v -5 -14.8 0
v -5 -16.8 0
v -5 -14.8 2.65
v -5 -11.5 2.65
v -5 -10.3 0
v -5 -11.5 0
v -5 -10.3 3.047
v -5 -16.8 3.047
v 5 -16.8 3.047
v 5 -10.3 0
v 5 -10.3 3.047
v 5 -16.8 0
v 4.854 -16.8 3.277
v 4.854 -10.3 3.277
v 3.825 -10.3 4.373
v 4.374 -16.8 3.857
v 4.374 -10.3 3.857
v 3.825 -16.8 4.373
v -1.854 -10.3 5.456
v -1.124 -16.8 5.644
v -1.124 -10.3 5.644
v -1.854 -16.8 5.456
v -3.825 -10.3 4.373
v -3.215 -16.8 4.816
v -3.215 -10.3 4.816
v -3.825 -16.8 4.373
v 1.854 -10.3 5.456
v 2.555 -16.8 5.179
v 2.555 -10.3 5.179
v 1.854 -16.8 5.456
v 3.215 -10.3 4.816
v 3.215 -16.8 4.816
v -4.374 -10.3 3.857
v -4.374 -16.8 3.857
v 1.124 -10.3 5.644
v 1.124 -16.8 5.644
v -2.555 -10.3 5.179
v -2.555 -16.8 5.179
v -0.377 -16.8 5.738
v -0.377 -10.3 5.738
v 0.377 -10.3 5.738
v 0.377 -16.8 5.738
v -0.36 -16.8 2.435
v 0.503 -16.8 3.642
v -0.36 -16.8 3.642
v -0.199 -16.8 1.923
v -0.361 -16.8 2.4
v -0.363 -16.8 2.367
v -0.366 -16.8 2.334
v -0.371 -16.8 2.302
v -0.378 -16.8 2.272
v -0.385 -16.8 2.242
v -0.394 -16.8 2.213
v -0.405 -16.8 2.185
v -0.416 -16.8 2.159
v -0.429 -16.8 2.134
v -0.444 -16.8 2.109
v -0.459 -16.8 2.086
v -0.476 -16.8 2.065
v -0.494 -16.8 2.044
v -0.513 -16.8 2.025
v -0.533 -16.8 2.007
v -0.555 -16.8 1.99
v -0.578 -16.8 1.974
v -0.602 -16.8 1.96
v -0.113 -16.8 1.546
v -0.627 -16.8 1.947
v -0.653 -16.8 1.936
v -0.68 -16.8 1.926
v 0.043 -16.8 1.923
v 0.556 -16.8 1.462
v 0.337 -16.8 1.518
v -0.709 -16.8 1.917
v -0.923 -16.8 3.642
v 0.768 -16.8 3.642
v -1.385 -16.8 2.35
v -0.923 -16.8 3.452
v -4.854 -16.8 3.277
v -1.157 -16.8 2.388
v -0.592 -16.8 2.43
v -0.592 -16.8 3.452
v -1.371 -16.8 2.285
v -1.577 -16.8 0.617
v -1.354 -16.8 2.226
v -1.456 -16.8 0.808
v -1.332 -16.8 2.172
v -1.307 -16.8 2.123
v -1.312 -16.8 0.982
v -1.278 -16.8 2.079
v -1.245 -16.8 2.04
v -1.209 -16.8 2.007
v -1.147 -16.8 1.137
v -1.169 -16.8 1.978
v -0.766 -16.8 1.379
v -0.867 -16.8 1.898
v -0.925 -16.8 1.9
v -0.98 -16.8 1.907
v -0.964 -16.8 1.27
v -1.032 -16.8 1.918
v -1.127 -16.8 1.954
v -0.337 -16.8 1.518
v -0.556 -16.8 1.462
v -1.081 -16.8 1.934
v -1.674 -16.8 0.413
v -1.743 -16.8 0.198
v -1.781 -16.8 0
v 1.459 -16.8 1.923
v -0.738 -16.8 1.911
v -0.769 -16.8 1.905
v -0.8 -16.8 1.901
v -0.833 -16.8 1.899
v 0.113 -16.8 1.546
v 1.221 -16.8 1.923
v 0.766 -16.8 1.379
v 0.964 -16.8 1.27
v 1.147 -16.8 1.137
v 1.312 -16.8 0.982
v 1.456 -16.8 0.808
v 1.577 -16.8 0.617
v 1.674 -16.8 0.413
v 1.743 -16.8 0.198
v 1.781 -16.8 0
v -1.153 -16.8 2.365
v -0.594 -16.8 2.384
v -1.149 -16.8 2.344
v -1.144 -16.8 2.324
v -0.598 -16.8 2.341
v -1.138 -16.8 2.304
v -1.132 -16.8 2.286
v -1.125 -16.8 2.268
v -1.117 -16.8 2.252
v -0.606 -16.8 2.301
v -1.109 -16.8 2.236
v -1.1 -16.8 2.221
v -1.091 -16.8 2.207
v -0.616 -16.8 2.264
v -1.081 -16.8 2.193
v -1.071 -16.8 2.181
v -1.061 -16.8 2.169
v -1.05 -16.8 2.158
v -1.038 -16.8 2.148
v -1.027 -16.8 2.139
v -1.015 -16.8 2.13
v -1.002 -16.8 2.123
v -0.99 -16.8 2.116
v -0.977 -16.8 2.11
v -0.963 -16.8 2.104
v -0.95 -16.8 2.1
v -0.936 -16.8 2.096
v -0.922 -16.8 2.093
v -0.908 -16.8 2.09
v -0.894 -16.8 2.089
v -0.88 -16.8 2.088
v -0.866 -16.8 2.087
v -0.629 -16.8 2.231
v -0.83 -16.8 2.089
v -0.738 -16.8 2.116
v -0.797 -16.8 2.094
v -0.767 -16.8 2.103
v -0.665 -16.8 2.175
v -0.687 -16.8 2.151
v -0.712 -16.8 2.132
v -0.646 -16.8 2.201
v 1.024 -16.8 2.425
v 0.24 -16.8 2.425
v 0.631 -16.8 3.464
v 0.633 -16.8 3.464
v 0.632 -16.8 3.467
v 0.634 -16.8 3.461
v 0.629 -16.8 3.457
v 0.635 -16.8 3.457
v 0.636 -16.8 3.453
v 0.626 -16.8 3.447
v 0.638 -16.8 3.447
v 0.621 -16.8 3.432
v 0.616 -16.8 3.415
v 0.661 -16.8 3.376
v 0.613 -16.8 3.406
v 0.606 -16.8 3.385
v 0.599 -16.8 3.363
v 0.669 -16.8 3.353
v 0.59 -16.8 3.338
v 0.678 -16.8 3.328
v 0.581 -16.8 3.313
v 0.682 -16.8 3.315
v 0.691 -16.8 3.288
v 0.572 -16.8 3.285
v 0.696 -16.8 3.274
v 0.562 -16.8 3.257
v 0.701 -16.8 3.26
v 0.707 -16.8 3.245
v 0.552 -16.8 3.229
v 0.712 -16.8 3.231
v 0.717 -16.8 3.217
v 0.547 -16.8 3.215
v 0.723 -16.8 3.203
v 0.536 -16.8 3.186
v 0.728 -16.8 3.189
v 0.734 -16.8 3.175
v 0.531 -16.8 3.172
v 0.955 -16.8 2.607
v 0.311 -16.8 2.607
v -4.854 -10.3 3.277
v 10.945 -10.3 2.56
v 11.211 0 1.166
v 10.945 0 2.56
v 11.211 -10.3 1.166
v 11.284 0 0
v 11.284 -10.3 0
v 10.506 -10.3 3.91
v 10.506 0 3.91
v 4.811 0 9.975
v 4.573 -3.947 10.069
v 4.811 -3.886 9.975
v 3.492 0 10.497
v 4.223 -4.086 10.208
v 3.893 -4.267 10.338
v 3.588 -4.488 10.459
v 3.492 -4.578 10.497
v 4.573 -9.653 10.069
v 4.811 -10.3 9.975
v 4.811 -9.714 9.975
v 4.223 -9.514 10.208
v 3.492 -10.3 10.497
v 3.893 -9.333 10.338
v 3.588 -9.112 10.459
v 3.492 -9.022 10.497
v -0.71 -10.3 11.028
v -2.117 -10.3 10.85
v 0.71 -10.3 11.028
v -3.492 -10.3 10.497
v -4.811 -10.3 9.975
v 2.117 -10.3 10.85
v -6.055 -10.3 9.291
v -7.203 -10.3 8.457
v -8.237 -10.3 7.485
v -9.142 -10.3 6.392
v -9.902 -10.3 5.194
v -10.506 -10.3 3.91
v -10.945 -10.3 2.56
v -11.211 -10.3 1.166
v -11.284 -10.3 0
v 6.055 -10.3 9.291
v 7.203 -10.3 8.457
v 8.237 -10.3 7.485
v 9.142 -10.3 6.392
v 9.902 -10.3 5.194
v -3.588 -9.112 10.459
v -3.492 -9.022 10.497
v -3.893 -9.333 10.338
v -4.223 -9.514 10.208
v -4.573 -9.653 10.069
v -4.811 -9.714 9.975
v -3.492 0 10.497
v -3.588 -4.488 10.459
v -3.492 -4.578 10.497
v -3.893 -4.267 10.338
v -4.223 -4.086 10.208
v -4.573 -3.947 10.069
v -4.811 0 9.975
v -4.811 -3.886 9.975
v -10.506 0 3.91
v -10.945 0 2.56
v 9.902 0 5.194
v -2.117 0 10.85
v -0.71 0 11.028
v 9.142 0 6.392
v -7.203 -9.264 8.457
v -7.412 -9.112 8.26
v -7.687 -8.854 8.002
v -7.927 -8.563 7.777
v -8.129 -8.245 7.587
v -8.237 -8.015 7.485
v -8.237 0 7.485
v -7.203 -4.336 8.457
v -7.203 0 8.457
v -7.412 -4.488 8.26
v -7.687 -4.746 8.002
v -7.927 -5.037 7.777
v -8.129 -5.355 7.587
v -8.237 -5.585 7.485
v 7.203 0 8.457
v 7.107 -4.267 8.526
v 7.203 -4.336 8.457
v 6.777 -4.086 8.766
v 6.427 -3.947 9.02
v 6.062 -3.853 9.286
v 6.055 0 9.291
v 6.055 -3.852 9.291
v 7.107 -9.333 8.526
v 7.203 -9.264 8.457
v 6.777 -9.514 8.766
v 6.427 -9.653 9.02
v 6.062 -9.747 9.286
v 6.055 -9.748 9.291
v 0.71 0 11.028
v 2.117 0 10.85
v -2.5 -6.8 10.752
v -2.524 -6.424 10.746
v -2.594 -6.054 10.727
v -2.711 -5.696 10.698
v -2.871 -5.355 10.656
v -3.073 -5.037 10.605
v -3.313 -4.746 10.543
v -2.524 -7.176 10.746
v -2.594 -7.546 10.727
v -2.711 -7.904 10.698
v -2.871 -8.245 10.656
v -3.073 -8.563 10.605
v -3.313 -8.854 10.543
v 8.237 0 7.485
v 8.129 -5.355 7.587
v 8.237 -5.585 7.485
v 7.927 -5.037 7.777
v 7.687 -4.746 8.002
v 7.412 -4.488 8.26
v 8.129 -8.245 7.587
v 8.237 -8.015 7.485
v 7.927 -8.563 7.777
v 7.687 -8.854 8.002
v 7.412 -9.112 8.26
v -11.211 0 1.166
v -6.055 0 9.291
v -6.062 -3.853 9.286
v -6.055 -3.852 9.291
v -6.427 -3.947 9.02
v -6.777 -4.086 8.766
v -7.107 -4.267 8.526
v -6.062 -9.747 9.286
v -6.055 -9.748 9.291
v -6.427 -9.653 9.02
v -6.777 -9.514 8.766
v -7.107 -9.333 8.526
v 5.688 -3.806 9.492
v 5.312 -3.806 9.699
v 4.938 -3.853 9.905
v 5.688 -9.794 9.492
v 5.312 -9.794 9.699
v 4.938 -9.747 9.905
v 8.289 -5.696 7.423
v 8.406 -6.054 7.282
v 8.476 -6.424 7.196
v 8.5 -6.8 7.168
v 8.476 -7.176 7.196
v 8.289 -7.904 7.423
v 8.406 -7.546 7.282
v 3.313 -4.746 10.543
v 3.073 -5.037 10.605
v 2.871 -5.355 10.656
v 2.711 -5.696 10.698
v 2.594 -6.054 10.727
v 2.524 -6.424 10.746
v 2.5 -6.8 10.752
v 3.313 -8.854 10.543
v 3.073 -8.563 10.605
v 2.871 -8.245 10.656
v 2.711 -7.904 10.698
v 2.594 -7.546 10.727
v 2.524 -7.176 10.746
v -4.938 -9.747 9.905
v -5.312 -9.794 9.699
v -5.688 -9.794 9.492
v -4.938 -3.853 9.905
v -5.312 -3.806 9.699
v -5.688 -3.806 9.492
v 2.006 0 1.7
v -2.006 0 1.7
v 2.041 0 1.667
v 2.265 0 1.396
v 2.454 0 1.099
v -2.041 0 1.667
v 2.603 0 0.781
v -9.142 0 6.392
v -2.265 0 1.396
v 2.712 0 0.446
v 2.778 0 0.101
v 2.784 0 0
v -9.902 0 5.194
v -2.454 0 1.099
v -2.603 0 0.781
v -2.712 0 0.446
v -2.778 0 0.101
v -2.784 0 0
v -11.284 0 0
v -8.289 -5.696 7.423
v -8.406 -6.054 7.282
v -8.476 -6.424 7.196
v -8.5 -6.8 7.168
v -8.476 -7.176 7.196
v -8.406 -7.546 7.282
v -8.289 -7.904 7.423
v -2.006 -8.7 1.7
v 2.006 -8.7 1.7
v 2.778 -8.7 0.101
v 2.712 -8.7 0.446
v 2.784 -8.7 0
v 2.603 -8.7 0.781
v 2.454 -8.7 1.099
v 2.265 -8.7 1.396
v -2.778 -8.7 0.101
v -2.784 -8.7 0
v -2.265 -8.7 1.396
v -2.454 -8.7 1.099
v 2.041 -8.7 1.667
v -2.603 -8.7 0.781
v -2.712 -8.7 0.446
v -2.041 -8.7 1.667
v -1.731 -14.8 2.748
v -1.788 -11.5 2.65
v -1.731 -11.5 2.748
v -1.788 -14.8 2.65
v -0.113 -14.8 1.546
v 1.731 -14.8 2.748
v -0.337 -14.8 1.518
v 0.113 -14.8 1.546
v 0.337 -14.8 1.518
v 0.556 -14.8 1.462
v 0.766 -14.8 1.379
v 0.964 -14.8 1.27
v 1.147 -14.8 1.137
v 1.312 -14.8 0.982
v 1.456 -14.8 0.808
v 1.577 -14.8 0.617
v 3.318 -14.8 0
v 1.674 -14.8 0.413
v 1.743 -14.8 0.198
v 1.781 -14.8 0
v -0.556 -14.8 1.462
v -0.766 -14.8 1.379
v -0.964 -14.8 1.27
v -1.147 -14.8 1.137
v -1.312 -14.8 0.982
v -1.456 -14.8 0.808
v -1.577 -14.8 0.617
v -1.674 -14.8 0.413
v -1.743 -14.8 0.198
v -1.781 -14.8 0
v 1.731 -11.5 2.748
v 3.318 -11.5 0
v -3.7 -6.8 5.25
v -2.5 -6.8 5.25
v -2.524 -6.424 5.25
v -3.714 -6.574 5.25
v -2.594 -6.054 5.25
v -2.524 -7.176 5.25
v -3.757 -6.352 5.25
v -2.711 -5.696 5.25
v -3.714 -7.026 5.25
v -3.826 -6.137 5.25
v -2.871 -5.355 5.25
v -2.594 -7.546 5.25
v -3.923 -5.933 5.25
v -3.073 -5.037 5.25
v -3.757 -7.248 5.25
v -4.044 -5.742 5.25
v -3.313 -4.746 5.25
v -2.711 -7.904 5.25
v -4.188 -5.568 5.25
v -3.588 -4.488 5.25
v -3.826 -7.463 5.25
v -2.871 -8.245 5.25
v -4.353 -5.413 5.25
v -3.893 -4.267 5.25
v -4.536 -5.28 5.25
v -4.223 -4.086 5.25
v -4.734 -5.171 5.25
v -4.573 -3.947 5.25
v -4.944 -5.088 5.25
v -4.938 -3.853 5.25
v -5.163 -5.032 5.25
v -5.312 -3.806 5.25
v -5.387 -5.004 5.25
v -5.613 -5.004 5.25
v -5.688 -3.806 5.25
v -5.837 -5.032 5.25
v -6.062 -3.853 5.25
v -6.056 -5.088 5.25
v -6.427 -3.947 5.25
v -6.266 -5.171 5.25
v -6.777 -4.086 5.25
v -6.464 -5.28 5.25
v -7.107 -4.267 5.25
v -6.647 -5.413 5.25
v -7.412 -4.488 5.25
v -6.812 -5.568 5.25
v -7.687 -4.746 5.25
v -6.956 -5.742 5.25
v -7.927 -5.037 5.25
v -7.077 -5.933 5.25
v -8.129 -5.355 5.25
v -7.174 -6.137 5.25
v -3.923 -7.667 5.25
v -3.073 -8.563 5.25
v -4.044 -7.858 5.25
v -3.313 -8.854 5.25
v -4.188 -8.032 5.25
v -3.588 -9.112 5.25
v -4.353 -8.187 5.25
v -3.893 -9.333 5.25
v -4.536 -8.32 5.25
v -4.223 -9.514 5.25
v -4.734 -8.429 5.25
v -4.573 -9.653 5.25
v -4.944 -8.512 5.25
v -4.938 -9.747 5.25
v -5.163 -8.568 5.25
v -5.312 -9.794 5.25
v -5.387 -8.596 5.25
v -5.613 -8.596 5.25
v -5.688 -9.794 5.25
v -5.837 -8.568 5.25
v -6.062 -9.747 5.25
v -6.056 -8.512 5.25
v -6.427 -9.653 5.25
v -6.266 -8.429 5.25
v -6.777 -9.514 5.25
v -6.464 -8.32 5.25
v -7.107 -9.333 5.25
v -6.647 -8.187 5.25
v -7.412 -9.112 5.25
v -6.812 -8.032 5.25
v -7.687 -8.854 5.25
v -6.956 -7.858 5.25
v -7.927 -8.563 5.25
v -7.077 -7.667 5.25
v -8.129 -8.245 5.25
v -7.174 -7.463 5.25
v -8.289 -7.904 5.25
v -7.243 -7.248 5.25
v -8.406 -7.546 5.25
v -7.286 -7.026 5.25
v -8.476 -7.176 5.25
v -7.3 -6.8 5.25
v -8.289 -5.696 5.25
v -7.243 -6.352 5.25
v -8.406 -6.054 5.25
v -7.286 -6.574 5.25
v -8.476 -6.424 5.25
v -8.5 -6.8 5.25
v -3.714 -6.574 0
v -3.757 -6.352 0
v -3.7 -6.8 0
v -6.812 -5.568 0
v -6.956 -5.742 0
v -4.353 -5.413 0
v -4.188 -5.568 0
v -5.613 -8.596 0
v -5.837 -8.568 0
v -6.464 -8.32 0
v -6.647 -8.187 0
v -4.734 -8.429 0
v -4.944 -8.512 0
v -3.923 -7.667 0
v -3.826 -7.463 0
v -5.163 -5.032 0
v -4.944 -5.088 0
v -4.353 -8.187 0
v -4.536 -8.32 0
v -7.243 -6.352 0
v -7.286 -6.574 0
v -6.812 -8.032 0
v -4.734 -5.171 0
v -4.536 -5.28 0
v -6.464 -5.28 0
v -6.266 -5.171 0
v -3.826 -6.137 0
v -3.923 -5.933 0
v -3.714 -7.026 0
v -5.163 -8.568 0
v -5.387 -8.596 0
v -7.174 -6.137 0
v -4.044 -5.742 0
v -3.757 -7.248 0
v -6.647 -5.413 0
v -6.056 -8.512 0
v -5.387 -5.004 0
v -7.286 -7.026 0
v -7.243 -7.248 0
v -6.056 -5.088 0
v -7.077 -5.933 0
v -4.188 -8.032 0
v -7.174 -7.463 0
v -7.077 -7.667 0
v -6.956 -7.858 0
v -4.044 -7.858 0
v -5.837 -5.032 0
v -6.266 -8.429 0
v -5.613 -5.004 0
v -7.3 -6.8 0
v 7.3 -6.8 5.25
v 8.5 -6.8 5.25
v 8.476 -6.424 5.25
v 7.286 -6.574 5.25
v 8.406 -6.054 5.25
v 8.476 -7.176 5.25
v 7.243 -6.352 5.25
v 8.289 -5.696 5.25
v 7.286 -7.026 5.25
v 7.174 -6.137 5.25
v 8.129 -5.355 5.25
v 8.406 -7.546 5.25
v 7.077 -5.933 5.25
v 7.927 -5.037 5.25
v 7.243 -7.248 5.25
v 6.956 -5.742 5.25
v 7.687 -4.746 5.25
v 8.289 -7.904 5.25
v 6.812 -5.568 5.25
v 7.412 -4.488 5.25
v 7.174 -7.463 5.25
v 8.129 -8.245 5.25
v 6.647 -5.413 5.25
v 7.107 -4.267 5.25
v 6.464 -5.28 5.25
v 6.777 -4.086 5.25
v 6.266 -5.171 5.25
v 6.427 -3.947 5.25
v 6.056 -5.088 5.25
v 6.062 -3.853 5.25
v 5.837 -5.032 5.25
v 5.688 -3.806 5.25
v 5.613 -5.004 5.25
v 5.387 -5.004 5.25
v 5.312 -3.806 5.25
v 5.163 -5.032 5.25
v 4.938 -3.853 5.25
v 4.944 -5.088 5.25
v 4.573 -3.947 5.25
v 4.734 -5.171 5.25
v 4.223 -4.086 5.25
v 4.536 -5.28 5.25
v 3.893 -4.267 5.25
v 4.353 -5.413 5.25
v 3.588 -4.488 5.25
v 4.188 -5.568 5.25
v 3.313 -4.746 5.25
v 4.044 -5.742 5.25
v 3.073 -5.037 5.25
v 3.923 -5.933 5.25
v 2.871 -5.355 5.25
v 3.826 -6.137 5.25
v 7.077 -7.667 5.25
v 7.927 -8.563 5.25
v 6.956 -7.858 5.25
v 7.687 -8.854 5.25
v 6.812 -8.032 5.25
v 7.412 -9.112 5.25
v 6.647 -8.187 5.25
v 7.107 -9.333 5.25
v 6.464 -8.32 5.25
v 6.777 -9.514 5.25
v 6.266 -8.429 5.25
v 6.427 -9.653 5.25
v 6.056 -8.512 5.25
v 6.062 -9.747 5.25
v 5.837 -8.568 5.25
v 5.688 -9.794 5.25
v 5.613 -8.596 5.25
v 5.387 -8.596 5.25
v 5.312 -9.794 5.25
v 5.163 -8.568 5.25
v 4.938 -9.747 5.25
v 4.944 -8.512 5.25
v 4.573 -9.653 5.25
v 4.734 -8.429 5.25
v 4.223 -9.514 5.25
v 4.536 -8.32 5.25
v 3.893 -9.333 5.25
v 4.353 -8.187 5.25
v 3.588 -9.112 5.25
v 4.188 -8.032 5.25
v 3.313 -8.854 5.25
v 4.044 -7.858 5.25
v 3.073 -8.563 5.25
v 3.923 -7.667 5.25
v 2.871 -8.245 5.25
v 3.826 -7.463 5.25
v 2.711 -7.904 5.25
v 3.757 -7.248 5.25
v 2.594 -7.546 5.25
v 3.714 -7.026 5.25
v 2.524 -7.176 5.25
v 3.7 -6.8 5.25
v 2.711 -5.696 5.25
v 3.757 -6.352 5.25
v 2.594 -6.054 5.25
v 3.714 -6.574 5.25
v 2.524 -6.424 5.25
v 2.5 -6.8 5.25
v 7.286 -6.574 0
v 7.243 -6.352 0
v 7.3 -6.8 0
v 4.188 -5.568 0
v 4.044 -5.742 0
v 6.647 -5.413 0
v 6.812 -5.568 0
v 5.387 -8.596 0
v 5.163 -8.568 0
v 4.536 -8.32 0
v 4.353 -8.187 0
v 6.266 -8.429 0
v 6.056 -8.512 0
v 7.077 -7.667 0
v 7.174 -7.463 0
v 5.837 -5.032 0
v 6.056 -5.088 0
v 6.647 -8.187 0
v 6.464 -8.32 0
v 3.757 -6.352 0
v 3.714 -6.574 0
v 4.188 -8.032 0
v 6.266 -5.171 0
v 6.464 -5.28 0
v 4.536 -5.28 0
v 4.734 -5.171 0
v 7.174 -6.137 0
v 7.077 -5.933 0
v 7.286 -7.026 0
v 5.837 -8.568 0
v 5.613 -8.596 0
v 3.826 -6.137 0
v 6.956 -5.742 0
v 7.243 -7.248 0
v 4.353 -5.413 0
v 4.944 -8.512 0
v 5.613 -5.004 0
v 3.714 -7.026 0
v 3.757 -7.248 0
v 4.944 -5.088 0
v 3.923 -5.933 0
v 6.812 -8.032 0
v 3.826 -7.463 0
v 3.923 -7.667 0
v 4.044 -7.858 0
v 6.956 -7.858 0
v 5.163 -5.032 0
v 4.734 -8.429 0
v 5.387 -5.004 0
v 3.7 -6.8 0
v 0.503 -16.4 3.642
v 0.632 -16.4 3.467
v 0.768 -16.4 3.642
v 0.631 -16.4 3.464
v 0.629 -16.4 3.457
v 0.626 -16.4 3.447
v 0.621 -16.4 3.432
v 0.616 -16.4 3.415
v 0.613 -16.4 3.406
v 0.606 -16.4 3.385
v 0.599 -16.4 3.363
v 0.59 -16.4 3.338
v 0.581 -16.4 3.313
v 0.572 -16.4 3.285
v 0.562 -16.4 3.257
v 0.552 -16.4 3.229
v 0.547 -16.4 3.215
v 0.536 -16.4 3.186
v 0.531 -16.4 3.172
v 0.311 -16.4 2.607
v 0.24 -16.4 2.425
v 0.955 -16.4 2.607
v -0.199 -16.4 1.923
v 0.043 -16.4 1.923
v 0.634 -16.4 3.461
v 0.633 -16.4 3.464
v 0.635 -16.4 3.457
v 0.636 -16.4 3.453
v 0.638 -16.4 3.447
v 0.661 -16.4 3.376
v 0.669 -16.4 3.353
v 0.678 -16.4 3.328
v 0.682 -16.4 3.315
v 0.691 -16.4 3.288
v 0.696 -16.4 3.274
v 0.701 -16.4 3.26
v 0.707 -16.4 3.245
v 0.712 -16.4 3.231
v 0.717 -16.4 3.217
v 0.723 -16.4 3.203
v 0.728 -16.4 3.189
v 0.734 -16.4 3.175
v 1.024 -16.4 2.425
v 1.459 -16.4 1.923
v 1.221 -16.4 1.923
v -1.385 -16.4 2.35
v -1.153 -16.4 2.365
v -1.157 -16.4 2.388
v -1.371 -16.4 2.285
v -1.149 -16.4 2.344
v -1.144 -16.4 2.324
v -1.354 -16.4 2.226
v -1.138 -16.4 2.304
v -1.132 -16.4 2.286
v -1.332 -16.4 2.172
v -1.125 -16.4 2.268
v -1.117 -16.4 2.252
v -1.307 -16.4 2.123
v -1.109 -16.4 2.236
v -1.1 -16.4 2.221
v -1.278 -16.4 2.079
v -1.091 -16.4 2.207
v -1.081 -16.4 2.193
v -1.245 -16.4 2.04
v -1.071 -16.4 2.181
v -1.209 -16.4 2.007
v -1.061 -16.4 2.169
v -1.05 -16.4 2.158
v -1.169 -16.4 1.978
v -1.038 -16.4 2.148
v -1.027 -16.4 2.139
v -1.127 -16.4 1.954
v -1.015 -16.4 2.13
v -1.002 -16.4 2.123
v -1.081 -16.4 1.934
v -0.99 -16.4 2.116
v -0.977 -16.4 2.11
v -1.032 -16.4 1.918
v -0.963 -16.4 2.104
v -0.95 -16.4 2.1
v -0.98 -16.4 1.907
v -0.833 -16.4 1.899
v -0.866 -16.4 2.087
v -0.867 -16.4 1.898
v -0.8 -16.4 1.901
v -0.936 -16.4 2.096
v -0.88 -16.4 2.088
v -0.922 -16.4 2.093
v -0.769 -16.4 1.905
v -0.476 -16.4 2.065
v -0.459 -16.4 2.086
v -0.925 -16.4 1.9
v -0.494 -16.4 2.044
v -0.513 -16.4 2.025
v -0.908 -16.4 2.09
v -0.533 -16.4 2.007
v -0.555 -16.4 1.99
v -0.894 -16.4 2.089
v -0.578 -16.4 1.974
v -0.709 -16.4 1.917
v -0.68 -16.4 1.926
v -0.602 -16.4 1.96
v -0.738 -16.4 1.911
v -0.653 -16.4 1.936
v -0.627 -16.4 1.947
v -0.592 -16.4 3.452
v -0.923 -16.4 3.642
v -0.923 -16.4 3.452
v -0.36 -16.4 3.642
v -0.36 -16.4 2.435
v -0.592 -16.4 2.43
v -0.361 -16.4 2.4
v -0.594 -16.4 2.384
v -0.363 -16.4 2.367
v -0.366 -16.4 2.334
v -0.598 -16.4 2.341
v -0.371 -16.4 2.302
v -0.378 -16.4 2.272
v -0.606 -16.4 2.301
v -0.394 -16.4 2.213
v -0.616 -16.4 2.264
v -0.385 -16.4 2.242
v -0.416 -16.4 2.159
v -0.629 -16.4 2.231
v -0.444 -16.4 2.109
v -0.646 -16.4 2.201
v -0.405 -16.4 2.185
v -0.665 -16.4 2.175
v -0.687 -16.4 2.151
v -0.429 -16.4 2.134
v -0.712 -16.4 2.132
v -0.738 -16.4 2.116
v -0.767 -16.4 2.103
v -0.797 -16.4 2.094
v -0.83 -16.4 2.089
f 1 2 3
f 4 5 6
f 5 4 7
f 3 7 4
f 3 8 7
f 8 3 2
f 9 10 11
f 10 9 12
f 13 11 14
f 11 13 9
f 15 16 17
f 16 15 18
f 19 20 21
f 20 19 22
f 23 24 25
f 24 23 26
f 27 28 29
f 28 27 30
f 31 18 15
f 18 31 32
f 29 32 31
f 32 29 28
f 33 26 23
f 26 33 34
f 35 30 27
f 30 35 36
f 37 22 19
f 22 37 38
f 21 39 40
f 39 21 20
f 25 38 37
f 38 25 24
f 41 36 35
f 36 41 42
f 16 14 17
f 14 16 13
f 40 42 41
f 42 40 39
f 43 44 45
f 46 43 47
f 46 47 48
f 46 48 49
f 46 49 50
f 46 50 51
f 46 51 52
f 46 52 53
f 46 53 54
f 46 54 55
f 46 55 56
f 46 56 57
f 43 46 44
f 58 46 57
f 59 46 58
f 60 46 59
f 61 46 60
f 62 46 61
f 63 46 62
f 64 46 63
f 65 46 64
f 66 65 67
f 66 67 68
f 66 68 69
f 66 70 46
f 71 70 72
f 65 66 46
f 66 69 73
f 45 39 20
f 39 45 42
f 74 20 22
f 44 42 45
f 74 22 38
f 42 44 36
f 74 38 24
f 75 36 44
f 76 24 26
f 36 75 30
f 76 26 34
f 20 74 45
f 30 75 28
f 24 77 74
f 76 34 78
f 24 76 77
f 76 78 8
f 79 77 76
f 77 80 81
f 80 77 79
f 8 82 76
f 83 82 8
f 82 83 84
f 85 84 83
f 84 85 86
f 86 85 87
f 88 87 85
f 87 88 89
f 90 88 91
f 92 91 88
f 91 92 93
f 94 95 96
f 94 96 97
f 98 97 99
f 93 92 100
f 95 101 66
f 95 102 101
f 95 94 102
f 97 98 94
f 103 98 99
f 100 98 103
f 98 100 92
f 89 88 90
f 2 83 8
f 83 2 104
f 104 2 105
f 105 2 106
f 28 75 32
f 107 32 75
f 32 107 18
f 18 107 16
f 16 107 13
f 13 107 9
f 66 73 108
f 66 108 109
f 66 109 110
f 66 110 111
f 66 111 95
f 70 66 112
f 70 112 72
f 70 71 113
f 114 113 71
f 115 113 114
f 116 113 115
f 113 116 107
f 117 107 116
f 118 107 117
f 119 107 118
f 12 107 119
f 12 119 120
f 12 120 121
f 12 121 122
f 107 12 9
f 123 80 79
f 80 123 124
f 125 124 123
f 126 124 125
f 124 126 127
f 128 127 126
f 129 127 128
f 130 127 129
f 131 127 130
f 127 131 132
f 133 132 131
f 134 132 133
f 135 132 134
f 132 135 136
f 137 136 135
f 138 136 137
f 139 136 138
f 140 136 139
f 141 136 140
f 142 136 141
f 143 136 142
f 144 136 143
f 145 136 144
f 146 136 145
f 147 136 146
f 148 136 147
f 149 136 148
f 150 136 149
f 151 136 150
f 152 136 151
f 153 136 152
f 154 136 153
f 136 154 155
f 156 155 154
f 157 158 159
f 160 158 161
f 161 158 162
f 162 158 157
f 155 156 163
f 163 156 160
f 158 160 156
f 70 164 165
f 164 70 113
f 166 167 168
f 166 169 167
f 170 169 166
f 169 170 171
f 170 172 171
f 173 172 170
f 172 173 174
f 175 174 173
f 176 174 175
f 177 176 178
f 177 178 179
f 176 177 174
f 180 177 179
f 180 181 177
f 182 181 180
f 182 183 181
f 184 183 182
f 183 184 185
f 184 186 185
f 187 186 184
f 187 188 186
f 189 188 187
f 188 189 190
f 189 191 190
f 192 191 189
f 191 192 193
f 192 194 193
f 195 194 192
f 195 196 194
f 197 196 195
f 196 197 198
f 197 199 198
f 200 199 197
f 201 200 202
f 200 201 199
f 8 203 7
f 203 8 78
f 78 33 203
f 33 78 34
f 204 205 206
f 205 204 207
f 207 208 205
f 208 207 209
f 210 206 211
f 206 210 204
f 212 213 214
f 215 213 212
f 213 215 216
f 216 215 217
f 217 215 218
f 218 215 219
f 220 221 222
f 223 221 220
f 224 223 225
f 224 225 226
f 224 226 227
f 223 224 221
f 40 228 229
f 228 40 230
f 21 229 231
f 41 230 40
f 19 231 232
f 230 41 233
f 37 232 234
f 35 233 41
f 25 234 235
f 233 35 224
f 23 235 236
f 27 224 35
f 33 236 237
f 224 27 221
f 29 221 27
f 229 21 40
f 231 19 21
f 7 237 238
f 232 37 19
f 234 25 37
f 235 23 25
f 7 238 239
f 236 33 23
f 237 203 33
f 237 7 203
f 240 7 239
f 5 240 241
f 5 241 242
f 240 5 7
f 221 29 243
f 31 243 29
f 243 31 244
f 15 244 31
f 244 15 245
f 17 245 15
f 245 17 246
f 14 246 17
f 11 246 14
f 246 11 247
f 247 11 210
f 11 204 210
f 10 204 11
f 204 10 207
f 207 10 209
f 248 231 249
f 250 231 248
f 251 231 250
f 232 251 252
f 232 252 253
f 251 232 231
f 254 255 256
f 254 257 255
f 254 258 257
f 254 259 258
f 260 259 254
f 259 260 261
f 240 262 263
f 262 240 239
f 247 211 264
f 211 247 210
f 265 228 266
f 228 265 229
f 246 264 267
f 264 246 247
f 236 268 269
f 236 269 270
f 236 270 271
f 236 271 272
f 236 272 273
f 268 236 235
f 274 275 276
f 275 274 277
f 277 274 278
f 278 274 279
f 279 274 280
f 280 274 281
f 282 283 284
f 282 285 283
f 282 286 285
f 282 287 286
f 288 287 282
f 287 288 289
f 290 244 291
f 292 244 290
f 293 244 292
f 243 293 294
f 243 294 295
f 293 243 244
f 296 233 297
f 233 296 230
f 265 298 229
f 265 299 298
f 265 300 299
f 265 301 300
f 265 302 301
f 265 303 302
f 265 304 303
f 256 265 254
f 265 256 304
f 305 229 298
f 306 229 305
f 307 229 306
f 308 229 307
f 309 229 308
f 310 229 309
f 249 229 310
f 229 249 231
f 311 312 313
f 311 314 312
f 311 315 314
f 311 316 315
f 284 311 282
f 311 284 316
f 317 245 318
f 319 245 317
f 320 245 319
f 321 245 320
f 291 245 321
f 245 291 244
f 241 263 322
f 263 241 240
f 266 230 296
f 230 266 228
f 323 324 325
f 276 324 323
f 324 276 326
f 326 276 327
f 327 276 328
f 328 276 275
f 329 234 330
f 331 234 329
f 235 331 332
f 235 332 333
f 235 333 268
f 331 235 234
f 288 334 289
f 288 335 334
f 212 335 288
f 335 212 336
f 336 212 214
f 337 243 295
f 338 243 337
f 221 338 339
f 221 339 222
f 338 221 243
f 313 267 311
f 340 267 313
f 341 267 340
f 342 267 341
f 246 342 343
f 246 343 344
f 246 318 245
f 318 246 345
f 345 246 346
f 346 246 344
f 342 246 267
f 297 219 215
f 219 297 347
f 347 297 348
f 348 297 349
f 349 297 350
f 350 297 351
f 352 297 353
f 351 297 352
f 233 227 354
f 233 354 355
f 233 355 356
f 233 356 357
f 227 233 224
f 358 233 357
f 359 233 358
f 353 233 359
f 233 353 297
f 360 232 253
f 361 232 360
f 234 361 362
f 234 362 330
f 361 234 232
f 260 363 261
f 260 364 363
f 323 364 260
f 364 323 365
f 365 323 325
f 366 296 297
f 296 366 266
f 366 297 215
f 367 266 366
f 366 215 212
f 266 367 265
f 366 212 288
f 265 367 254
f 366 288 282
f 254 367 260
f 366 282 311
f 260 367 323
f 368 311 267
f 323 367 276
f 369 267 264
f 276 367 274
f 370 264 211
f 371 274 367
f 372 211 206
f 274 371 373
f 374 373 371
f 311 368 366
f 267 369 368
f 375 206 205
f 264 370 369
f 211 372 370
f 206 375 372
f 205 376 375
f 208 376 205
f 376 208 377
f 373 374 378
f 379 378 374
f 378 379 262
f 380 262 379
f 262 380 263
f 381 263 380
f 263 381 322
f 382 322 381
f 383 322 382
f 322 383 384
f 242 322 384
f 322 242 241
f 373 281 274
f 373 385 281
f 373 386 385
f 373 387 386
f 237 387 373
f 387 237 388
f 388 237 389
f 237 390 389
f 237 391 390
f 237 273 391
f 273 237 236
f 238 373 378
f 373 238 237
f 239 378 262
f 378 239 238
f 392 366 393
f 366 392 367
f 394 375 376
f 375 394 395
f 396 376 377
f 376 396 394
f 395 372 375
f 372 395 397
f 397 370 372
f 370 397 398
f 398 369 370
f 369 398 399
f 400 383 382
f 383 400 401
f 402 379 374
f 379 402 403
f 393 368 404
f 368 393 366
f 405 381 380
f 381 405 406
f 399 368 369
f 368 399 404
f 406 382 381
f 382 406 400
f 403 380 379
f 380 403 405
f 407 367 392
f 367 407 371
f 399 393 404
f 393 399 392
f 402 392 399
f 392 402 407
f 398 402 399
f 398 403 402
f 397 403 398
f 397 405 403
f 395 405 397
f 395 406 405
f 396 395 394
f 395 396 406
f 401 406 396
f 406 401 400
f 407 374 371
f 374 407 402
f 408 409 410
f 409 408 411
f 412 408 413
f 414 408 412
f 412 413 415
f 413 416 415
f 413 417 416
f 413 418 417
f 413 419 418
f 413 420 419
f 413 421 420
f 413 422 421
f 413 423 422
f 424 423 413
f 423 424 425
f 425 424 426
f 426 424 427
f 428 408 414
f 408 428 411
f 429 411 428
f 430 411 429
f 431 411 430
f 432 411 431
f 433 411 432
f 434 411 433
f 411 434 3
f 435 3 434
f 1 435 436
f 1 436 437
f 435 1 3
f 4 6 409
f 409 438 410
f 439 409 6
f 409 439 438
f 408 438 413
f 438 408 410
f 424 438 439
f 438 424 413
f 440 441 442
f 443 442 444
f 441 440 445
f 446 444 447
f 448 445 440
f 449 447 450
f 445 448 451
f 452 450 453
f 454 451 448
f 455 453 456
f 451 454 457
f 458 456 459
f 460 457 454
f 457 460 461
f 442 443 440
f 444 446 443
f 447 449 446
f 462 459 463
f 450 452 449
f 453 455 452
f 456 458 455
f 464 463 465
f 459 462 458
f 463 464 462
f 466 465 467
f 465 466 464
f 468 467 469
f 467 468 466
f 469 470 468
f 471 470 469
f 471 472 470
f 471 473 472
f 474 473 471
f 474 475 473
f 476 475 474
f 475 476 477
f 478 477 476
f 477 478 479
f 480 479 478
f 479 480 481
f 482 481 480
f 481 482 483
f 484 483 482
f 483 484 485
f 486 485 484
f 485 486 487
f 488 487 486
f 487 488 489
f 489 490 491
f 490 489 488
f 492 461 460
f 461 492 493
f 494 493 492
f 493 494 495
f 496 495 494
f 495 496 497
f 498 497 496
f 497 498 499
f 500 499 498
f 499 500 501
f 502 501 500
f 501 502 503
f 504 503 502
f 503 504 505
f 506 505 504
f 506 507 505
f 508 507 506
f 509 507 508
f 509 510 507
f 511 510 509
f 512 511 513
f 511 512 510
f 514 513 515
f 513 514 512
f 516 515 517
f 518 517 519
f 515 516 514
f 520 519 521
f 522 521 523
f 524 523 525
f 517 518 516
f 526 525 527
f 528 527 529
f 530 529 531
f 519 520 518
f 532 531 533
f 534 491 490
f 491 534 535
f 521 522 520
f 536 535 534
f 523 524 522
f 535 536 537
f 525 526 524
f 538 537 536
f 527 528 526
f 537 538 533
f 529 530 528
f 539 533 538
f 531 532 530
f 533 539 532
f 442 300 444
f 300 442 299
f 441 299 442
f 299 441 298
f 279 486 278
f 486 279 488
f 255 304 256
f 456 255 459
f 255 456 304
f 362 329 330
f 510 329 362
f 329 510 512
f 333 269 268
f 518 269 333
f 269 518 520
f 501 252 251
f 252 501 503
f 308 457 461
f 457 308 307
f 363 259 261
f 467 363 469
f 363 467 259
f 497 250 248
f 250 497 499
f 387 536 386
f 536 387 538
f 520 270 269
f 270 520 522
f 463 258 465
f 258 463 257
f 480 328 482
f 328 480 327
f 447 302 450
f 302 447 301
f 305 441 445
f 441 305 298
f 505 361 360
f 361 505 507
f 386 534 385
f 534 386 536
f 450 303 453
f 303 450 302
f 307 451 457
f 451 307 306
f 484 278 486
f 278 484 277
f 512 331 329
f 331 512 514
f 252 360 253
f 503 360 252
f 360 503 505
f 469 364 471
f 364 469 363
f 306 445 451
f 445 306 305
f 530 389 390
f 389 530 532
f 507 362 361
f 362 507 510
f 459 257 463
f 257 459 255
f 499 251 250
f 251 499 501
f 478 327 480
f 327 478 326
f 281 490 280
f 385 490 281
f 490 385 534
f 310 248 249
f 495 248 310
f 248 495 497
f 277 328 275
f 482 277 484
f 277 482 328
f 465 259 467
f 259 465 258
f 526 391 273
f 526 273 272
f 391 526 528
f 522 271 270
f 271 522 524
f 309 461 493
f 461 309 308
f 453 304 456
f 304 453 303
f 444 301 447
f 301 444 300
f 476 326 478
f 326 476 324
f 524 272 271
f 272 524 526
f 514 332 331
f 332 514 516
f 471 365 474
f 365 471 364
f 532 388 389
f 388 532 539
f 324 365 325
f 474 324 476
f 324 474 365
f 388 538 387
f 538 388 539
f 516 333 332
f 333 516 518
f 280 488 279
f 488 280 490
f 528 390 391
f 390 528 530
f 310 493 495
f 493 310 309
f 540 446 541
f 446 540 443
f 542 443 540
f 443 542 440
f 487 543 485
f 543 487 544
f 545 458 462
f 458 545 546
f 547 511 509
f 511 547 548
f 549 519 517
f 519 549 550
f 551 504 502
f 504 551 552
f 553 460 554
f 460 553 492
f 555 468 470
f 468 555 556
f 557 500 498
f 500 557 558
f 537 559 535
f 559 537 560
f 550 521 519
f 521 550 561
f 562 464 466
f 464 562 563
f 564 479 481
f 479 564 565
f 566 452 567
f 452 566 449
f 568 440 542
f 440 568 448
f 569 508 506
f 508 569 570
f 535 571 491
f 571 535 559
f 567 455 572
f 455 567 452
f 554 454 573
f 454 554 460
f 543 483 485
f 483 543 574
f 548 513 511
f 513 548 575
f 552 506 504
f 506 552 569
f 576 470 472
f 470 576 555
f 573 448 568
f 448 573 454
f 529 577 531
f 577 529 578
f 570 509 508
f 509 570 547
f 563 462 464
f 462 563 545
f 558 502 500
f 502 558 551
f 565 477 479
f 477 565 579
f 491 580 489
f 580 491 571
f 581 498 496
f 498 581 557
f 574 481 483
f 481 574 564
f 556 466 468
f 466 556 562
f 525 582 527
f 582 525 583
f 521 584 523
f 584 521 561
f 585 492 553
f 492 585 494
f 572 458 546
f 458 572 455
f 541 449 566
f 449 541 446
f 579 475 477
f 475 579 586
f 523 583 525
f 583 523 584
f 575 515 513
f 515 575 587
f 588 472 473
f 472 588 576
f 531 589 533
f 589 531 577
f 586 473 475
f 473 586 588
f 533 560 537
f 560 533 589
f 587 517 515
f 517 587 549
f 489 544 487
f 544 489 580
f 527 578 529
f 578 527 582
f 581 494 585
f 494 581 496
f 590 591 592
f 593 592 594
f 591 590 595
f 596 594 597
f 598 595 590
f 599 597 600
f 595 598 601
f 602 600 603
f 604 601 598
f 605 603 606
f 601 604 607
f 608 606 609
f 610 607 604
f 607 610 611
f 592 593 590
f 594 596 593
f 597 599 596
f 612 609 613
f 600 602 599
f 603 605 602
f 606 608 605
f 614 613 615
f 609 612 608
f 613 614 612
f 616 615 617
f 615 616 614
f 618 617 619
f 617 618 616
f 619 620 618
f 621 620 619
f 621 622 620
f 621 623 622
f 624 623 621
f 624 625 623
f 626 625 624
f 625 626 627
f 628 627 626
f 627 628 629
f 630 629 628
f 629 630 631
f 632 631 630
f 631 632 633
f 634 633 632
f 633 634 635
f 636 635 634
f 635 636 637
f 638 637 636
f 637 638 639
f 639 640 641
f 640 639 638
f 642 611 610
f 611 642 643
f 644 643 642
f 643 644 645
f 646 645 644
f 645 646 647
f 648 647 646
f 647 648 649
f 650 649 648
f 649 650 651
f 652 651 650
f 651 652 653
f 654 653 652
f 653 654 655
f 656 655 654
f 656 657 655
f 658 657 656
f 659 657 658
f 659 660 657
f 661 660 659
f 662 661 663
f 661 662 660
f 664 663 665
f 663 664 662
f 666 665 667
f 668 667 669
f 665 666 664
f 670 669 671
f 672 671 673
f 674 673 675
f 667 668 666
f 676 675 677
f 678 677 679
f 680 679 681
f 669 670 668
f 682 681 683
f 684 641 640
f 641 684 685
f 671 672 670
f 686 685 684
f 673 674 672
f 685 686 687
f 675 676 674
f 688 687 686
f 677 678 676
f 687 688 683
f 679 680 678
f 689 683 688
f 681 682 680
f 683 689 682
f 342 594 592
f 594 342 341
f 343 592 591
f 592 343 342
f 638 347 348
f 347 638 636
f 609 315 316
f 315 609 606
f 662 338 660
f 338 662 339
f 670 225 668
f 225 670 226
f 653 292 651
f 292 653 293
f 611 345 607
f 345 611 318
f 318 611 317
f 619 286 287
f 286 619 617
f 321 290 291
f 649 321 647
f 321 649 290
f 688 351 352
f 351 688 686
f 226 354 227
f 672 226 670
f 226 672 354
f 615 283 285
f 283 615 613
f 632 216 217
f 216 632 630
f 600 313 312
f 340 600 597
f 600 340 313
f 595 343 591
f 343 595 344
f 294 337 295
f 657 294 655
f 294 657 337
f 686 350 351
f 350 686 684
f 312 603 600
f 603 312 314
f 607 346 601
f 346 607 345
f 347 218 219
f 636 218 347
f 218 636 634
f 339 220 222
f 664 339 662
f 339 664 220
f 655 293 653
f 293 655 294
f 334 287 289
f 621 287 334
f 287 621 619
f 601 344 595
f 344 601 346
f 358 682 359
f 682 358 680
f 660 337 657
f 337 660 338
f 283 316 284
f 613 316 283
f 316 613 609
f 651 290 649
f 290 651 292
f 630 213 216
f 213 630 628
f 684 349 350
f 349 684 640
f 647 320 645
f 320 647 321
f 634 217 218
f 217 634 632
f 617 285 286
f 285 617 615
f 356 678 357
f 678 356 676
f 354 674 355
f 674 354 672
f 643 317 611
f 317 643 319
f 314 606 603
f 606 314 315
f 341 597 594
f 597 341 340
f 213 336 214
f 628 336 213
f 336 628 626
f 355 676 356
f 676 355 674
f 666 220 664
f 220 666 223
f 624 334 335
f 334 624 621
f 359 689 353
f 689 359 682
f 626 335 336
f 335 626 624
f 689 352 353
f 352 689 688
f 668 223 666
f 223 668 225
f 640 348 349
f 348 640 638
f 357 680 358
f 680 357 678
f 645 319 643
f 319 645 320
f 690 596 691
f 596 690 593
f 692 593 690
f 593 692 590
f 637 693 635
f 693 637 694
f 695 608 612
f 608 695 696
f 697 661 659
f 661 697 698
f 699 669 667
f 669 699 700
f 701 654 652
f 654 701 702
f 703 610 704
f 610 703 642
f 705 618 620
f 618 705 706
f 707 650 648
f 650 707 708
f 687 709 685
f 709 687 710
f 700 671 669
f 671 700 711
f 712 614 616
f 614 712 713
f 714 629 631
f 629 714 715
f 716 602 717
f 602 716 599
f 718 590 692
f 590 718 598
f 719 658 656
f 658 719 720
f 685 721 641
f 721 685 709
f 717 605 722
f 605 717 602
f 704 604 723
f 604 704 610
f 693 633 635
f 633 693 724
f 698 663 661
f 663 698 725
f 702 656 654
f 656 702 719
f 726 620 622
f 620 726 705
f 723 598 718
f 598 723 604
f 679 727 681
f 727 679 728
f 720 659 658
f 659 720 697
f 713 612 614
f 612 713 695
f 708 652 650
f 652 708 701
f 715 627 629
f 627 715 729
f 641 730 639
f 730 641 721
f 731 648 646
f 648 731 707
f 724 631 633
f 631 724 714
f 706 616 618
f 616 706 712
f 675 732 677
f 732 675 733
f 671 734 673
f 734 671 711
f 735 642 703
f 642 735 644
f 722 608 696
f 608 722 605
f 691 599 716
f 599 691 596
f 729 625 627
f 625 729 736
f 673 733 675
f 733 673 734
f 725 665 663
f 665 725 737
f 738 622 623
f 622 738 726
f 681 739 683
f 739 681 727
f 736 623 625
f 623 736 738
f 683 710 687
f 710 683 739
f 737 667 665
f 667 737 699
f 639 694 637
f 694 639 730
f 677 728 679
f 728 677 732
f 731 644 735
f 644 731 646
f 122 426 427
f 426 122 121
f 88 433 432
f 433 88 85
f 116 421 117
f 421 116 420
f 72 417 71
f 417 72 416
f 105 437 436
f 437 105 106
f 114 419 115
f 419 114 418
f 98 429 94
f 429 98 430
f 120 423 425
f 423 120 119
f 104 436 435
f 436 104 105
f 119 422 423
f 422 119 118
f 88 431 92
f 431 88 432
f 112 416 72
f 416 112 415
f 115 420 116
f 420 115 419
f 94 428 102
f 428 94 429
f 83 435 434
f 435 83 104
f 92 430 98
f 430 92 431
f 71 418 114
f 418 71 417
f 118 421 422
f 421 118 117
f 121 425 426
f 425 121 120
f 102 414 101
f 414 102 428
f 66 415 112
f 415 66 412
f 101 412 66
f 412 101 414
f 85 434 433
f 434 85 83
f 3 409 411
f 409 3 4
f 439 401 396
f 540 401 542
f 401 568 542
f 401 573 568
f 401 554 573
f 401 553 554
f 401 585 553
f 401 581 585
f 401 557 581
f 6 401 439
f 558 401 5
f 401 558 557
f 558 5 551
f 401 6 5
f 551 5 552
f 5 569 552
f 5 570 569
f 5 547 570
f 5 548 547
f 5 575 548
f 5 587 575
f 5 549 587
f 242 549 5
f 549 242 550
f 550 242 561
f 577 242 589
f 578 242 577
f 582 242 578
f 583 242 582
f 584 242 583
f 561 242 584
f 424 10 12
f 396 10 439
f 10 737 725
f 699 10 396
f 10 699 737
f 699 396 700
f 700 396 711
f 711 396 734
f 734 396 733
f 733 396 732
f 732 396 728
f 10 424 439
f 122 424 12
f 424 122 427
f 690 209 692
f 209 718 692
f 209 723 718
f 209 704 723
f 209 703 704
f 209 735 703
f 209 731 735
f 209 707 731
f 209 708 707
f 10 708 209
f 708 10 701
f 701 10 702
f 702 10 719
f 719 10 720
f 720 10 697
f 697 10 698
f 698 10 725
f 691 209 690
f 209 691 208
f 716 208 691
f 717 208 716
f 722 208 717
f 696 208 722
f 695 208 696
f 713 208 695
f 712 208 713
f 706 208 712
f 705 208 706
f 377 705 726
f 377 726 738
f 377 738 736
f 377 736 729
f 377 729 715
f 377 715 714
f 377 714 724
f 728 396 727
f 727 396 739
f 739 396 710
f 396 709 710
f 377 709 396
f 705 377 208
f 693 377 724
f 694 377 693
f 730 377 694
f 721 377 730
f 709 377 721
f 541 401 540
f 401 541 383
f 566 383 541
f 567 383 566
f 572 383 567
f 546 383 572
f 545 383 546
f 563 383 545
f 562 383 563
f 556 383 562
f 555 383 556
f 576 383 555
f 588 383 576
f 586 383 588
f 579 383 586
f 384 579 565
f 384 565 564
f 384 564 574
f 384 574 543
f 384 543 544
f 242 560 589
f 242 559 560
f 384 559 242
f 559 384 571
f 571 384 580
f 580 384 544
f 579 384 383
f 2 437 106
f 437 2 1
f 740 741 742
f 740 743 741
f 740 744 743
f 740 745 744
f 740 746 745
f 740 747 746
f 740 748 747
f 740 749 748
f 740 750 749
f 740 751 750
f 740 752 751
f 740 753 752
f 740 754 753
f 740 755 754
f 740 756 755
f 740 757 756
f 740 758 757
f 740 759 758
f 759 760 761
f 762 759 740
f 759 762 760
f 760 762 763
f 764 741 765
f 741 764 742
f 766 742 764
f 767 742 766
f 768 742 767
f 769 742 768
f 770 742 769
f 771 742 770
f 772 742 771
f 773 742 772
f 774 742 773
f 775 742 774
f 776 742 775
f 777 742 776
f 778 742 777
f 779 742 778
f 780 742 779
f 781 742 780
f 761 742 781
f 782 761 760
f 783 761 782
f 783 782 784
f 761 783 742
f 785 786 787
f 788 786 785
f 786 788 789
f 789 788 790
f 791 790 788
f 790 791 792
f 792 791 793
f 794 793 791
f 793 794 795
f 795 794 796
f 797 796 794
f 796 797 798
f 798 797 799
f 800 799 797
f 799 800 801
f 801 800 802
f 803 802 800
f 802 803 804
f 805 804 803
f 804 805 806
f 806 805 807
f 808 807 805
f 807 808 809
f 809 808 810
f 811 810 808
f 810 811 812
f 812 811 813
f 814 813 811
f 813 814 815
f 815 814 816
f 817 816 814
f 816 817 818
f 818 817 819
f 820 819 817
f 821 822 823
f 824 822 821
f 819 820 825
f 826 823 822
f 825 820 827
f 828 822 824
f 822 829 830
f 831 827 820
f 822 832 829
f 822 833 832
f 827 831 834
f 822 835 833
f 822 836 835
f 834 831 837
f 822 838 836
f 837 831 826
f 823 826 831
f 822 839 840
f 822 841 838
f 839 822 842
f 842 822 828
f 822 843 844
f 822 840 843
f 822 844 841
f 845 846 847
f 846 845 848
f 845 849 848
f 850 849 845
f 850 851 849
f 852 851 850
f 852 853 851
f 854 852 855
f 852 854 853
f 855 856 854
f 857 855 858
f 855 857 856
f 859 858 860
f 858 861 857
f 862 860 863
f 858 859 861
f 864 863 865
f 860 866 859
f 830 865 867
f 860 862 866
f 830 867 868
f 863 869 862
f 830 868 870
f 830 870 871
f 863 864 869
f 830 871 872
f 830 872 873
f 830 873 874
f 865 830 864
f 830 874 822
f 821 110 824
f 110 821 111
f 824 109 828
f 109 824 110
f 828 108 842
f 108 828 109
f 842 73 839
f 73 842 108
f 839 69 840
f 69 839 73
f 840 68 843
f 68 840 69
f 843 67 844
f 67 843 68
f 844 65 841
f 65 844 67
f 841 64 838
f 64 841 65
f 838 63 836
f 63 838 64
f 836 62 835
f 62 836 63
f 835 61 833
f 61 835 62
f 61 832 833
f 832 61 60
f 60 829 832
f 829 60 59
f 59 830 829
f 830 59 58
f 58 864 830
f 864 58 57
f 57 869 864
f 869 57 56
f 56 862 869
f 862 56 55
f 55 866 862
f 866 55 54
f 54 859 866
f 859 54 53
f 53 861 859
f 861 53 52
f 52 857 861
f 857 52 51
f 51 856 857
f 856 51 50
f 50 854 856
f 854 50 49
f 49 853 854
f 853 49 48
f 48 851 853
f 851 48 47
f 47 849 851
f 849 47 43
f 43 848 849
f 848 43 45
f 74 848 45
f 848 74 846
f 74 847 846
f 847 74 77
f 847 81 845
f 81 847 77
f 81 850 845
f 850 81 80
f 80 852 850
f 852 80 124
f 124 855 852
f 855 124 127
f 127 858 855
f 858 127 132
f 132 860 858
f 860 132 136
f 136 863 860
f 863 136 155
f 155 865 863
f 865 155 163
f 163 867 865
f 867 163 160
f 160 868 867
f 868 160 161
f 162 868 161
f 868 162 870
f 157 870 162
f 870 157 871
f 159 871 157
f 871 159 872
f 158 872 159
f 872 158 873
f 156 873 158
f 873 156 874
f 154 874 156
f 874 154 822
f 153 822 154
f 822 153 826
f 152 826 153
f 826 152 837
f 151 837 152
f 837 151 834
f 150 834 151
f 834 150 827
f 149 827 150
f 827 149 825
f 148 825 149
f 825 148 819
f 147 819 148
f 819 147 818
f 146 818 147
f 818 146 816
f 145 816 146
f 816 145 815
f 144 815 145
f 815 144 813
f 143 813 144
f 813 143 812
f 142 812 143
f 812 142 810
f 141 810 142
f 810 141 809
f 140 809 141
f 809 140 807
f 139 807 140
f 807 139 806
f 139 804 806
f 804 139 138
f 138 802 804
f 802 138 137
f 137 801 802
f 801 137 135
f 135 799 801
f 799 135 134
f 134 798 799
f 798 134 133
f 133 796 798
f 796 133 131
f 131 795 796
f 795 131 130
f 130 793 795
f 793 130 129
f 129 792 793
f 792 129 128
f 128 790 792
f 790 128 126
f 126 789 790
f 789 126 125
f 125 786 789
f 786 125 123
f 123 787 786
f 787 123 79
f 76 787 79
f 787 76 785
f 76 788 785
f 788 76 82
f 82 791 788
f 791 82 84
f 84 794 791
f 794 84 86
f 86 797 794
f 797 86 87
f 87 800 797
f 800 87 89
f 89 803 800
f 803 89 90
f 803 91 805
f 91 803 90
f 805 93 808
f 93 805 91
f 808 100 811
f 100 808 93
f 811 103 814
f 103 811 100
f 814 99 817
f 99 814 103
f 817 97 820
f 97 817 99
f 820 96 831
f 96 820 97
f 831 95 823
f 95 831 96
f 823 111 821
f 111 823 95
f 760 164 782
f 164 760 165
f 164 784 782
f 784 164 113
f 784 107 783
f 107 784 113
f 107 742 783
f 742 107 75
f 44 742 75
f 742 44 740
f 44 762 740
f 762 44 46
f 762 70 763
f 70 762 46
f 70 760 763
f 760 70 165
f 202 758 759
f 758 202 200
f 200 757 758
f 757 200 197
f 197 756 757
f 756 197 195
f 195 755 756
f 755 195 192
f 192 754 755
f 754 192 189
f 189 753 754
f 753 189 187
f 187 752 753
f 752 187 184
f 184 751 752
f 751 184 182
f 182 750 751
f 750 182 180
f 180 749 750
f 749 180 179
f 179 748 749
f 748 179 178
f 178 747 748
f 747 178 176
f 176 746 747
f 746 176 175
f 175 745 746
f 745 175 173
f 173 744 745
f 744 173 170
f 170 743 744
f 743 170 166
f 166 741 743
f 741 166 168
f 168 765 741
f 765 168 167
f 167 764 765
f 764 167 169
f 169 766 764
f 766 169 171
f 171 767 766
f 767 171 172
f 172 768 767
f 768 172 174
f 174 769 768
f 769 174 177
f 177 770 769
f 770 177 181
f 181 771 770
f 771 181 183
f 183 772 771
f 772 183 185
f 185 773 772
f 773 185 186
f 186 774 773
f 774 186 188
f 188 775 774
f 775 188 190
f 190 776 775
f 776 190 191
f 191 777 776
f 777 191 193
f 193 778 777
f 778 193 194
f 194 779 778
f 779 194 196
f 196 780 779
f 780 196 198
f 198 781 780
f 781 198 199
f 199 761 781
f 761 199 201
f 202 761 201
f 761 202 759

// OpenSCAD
$fn = 50;

difference() {
	union() {
		translate(v = [0, 3.5, -0.25]) {
			rotate(a = [90, 0, 0]) {
				difference() {
					union() {
						translate(v = [0, 0, 0]) {
							rotate(a = [0, 0, 0]) {
								difference() {
									union() {
										translate(v = [0, 0, 13.79]) {
											cylinder(h = 6.51, r = 6.0);
										}
									}
									union() {
										translate(v = [-25.0, -20.0, 12.790000000000001]) {
											cube(size = [20, 40, 8.51]);
										}
										translate(v = [5.0, -20.0, 12.790000000000001]) {
											cube(size = [20, 40, 8.51]);
										}
									}
								}
							}
						}
						translate(v = [0, 0, 3.5]) {
							cylinder(h = 10.3, r = 11.3);
						}
					}
					union() {
						translate(v = [0, 0, 0]) {
							rotate(a = [0, 0, 0]) {
								difference() {
									union() {
										translate(v = [0, 0, 3.4]) {
											cylinder(h = 8.799999999999999, r = 2.8000000000000003);
										}
									}
									union() {
										translate(v = [-20.0, -21.95, 2.4]) {
											cube(size = [40, 20, 10.799999999999999]);
										}
										translate(v = [-20.0, 1.9499999999999993, 2.4]) {
											cube(size = [40, 20, 10.799999999999999]);
										}
									}
								}
							}
						}
						translate(v = [0, 0, 15]) {
							rotate(a = [0, 0, 0]) {
								difference() {
									union() {
										linear_extrude(height = 3.3) {
											polygon(points = [[3.4619999999999997, 0.0], [1.7310000000000003, 2.9981799479017264], [-1.7309999999999992, 2.9981799479017264], [-3.4619999999999997, 4.2397272186481365e-16], [-1.7310000000000014, -2.998179947901726], [1.7309999999999977, -2.9981799479017277]]);
										}
									}
									union();
								}
							}
						}
						translate(v = [-5.5, 5.5, 10.3]) {
							rotate(a = [-90, 0, 0]) {
								difference() {
									union() {
										translate(v = [0, 0, -12.0]) {
											cylinder(h = 12, r = 1.5);
										}
										cylinder(h = 253.2, r = 3.0);
										translate(v = [0, 0, -12.0]) {
											cylinder(h = 12, r = 1.8);
										}
										translate(v = [0, 0, -12.0]) {
											cylinder(h = 12, r = 1.5);
										}
									}
									union();
								}
							}
						}
						translate(v = [-5.5, -13.2, 10.3]) {
							rotate(a = [-90, 0, 0]) {
								difference() {
									union() {
										linear_extrude(height = 10) {
											polygon(points = [[3.4619999999999997, 0.0], [1.7310000000000003, 2.9981799479017264], [-1.7309999999999992, 2.9981799479017264], [-3.4619999999999997, 4.2397272186481365e-16], [-1.7310000000000014, -2.998179947901726], [1.7309999999999977, -2.9981799479017277]]);
										}
									}
									union();
								}
							}
						}
						translate(v = [5.5, 5.5, 10.3]) {
							rotate(a = [-90, 0, 0]) {
								difference() {
									union() {
										translate(v = [0, 0, -12.0]) {
											cylinder(h = 12, r = 1.5);
										}
										cylinder(h = 253.2, r = 3.0);
										translate(v = [0, 0, -12.0]) {
											cylinder(h = 12, r = 1.8);
										}
										translate(v = [0, 0, -12.0]) {
											cylinder(h = 12, r = 1.5);
										}
									}
									union();
								}
							}
						}
						translate(v = [5.5, -13.2, 10.3]) {
							rotate(a = [-90, 0, 0]) {
								difference() {
									union() {
										linear_extrude(height = 10) {
											polygon(points = [[3.4619999999999997, 0.0], [1.7310000000000003, 2.9981799479017264], [-1.7309999999999992, 2.9981799479017264], [-3.4619999999999997, 4.2397272186481365e-16], [-1.7310000000000014, -2.998179947901726], [1.7309999999999977, -2.9981799479017277]]);
										}
									}
									union();
								}
							}
						}
						translate(v = [0, 0, 15]) {
							cylinder(h = 6.300000000000001, r = 1.8);
						}
						translate(v = [-8.0, -2.9, 15]) {
							cube(size = [8, 5.8, 3.3]);
						}
						translate(v = [-25.0, -29.75, 2.5]) {
							cube(size = [50, 30, 40]);
						}
						translate(v = [0, 3, 19.900000000000002]) {
							linear_extrude(height = 0.45) {
								text(font = "Liberation Sans", halign = "center", size = 1.8, text = "JA", valign = "center");
							}
						}
					}
				}
			}
		}
	}
	union();
}
